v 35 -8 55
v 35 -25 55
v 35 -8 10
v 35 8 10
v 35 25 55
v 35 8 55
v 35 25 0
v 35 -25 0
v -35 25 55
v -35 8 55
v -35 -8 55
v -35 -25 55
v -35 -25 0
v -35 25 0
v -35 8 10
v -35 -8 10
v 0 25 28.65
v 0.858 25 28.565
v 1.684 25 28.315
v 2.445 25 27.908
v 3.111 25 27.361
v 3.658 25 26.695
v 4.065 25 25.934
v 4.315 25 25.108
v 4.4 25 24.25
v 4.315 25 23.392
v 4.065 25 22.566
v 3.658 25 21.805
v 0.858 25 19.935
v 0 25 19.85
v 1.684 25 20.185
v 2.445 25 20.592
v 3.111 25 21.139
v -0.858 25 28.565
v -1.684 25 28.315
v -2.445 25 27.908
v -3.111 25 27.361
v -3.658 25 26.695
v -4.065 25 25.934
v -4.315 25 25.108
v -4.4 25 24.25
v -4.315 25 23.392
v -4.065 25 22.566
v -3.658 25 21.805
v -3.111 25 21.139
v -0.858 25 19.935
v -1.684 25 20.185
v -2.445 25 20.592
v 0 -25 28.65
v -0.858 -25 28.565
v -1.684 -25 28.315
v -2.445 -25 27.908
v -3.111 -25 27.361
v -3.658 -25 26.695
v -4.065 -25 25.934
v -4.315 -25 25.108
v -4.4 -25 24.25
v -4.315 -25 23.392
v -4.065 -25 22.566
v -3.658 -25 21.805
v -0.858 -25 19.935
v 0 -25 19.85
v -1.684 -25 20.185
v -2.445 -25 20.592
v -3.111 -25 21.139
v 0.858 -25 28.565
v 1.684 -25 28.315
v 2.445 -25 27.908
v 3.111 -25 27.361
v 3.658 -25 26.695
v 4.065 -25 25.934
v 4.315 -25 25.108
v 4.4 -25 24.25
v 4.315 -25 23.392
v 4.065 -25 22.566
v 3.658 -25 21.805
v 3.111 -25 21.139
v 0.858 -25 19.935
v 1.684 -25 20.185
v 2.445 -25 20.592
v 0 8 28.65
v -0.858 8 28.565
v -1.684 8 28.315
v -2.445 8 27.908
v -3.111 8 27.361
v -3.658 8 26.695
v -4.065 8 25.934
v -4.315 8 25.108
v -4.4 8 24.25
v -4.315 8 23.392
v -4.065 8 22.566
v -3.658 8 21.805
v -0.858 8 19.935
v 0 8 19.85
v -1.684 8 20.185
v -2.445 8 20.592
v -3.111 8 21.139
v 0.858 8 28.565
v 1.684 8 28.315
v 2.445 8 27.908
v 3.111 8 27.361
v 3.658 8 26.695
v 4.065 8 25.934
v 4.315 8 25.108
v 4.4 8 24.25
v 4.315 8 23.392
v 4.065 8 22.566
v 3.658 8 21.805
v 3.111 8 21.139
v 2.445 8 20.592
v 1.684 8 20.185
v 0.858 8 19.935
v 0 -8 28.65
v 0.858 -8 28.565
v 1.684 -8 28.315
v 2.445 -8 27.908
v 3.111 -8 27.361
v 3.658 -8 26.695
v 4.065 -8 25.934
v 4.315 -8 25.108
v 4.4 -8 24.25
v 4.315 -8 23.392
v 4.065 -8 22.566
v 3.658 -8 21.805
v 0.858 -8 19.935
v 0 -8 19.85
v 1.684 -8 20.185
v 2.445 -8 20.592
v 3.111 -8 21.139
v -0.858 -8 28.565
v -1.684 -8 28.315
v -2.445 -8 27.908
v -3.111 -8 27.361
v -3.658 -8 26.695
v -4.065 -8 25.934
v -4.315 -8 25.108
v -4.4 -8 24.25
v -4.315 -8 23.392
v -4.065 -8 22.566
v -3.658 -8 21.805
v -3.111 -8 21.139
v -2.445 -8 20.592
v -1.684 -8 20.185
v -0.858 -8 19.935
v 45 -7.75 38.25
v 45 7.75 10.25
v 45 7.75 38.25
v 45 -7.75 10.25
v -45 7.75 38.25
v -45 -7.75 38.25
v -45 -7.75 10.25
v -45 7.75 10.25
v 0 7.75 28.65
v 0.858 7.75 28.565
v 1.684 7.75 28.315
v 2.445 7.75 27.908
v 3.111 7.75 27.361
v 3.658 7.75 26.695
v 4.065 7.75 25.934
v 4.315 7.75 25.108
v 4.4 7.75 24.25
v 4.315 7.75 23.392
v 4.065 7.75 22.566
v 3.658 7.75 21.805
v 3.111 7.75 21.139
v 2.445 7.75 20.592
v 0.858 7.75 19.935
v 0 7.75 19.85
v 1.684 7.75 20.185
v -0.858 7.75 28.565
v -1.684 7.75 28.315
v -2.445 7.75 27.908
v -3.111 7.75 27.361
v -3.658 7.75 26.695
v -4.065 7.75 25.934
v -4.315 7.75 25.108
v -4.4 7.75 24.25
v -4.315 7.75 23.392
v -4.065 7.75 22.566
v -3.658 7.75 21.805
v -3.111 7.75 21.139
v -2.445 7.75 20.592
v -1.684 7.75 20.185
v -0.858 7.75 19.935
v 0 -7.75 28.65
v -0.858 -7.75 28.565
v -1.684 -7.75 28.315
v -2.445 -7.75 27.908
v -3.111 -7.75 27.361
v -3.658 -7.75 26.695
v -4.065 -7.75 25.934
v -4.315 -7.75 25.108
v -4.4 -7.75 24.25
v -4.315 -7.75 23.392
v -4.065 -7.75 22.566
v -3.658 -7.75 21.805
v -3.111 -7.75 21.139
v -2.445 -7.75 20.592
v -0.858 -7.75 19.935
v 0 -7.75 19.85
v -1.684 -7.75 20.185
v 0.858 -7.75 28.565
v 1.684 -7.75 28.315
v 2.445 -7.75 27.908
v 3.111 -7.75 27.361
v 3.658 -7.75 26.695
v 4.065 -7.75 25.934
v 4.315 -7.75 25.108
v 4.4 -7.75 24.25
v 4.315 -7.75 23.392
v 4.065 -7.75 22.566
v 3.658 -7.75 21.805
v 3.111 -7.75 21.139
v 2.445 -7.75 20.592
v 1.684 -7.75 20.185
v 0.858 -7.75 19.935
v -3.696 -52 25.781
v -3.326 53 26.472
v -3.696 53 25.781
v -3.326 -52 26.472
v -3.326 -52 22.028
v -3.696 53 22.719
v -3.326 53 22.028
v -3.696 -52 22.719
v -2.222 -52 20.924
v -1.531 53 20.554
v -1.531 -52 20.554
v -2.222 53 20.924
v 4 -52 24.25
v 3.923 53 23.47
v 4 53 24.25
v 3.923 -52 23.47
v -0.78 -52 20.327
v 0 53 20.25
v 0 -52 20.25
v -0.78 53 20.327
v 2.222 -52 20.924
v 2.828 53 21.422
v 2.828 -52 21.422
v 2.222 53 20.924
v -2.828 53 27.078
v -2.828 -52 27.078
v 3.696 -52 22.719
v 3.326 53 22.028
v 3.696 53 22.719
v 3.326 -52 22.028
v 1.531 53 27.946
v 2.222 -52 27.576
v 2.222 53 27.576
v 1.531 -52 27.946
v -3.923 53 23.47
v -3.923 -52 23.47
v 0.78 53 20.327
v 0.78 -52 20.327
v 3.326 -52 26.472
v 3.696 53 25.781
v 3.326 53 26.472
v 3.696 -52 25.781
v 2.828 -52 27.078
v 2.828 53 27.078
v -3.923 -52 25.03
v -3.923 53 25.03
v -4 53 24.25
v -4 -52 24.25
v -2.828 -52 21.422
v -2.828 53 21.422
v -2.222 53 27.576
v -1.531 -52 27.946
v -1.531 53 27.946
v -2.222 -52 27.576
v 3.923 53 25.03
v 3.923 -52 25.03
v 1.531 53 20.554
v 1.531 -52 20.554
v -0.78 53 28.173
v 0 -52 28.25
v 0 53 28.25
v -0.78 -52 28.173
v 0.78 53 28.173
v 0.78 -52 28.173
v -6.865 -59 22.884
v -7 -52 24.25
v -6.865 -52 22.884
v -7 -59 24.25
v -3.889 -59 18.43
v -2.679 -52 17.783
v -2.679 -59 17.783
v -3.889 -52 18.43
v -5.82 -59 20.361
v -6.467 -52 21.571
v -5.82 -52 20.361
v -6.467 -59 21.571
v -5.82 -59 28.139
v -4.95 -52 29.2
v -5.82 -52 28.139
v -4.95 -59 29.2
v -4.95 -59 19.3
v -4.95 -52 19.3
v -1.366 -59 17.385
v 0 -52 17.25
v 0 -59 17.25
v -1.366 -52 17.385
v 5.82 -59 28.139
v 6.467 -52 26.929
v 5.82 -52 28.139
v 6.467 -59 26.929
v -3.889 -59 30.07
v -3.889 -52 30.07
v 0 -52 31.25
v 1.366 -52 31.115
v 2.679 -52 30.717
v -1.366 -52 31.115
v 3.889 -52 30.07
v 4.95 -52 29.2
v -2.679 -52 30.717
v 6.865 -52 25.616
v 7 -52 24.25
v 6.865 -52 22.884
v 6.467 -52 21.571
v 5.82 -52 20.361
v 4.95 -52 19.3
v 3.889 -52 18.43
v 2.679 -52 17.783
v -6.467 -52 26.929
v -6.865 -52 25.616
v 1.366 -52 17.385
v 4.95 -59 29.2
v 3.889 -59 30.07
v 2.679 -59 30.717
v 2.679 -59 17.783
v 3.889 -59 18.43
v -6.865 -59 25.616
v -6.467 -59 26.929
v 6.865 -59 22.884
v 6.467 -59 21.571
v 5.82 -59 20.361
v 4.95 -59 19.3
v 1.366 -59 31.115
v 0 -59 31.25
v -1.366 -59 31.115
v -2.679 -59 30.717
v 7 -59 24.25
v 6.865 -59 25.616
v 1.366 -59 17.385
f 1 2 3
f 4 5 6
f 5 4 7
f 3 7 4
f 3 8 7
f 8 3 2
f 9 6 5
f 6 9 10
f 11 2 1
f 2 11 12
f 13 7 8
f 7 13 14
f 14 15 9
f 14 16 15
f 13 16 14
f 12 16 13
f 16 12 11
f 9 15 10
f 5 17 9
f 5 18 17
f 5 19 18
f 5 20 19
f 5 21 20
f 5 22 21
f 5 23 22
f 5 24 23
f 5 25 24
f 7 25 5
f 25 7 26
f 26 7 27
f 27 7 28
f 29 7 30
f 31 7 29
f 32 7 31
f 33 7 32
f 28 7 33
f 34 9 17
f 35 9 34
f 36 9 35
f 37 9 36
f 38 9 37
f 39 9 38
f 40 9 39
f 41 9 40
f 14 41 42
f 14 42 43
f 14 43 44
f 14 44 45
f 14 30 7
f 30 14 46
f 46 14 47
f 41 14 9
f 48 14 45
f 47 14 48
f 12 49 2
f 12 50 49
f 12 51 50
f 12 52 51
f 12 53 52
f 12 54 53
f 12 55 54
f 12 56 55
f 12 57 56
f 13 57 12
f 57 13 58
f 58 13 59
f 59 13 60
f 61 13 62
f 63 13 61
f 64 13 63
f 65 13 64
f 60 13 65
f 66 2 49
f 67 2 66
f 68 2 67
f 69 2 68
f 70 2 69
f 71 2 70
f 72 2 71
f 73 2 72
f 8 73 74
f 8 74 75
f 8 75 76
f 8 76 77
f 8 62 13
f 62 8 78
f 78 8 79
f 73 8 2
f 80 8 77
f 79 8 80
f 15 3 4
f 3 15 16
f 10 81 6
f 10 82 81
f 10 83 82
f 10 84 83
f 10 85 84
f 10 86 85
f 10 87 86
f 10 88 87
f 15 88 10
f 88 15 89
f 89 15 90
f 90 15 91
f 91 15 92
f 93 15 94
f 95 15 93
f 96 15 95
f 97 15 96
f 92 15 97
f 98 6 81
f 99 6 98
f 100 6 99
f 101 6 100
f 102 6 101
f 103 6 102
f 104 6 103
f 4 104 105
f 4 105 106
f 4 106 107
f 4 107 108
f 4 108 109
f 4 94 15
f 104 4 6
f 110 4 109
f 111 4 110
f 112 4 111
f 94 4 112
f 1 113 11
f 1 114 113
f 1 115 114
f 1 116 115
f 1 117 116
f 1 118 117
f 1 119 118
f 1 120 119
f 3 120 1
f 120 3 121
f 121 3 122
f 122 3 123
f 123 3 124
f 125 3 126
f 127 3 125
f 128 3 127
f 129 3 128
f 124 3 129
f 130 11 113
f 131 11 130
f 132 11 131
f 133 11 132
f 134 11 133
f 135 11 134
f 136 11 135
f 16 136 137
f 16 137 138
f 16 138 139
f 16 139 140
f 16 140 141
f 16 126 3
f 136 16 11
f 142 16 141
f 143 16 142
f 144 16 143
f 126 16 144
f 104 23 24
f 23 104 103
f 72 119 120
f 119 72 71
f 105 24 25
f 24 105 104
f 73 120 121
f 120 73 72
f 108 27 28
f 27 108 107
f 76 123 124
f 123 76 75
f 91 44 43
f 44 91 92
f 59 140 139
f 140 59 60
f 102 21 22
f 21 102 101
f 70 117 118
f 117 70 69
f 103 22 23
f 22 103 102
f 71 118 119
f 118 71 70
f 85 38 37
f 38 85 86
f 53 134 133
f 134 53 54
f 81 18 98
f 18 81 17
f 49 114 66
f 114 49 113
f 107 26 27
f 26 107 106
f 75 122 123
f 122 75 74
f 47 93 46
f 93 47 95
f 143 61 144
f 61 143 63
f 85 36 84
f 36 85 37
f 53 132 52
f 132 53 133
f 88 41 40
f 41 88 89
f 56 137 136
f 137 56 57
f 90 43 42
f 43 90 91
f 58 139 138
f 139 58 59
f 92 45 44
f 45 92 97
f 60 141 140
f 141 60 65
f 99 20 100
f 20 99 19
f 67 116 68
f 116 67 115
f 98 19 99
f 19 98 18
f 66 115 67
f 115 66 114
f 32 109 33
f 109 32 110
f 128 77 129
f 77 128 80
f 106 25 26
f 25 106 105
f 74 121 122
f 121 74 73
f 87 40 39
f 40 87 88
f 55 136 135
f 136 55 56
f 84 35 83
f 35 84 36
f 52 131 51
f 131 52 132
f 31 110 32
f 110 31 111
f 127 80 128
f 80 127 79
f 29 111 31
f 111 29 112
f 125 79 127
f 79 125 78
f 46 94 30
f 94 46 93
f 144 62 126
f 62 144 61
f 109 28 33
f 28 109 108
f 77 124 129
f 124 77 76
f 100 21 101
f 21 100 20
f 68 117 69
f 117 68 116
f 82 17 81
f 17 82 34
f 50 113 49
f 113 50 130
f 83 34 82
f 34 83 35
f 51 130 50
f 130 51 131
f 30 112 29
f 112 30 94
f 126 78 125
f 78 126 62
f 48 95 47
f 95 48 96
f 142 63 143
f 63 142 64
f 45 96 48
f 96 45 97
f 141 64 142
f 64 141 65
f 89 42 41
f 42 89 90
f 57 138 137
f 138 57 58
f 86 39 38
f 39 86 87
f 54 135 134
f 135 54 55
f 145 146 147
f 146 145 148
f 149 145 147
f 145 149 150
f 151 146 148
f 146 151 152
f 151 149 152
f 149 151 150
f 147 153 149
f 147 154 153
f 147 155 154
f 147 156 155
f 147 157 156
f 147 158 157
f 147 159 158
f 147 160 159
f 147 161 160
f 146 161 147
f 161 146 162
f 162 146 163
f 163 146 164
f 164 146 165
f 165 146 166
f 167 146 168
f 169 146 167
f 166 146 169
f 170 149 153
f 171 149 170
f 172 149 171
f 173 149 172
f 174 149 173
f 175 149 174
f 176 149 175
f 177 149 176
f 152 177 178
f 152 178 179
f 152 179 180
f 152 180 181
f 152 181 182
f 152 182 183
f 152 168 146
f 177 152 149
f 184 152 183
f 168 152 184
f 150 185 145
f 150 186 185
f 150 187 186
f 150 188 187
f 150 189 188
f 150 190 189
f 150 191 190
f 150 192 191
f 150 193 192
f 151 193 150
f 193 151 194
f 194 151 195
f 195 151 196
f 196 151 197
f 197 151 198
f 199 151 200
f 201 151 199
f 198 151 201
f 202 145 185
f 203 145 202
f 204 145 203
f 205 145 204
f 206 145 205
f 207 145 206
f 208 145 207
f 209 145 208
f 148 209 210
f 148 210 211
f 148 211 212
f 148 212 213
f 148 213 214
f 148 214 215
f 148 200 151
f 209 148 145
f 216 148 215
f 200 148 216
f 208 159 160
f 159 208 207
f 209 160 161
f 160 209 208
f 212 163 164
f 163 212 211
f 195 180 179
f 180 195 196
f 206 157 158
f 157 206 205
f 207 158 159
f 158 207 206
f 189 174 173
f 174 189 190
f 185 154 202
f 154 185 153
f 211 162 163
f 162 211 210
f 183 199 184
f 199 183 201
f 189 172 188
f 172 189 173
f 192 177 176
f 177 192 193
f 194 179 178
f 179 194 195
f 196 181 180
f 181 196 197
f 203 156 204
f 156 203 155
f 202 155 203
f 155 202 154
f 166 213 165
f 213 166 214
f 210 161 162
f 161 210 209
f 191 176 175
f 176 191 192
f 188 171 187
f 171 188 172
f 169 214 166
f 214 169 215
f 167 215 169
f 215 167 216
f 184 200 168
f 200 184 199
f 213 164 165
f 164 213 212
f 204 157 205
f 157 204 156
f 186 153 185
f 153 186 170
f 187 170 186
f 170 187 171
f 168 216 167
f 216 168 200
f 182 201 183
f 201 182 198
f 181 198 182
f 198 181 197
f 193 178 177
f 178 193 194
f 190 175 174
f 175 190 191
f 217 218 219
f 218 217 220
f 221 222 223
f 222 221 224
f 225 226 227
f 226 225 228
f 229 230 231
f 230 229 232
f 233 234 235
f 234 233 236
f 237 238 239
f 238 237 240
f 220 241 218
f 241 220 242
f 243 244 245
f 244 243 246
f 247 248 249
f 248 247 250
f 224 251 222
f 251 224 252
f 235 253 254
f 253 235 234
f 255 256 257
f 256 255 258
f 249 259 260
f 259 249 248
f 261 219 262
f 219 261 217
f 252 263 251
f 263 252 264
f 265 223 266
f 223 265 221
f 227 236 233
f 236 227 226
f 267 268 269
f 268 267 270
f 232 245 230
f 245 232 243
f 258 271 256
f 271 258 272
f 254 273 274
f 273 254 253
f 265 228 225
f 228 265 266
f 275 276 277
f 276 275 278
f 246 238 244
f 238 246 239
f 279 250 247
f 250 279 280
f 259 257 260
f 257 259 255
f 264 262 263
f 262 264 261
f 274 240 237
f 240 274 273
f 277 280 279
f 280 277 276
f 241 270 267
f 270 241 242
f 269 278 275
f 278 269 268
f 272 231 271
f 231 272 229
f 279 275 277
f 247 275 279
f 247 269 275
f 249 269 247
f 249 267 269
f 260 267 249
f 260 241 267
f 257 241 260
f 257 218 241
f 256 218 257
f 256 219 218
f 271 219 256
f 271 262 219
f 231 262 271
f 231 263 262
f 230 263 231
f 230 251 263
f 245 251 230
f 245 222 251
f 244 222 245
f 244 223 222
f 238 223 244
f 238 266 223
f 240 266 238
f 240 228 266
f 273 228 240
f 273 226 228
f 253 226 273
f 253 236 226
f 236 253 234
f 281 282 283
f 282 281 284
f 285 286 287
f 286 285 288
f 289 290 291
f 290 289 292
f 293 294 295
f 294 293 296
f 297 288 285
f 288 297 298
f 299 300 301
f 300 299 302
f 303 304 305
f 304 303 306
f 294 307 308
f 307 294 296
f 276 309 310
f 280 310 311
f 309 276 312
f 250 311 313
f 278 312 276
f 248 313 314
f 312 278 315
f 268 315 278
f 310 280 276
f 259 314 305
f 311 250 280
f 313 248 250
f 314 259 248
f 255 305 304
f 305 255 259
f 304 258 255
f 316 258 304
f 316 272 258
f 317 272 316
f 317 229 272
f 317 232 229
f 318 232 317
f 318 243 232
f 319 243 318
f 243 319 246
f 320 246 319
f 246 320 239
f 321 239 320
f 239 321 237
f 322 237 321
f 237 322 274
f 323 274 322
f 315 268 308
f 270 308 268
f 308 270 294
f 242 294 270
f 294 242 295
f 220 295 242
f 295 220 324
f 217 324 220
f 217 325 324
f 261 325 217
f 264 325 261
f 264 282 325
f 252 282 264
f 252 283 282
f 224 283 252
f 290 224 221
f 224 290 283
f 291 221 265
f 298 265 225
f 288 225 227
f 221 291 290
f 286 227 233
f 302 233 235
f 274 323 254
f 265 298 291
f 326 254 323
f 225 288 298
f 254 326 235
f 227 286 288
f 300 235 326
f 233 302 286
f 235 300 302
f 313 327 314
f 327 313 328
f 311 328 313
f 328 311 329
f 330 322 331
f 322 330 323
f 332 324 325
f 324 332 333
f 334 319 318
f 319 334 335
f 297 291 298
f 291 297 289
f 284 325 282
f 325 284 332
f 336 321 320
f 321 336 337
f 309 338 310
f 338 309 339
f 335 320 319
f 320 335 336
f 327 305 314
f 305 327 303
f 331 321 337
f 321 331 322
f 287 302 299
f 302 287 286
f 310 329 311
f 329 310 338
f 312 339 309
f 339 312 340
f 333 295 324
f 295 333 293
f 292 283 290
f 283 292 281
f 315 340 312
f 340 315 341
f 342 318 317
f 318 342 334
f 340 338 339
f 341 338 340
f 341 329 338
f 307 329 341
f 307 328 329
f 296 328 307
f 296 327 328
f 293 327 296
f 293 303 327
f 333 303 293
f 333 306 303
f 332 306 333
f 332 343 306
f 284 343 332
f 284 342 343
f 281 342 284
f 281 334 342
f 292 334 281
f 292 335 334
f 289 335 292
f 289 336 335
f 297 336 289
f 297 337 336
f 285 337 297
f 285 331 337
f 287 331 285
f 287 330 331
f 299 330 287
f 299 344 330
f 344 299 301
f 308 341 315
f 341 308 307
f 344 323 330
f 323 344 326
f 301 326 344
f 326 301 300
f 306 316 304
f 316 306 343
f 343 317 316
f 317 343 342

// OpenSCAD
$fn = 32;

// ------------------------------------------------------------------------
// Clevis joint: 70 mm clevis, pin d8
// Every part is its own module, assembly() places them once.
// ------------------------------------------------------------------------

// --- part 1 ---
module clevis() {
  difference() {
    translate([-35, -25, 0]) cube([70, 50, 55]);
    translate([-36, -8, 10]) cube([72, 16, 46]);
    translate([0, 0, 24.25]) rotate([90, 0, 0]) cylinder(h = 52, d = 8.8, center = true);
  }
}

// --- part 2 ---
module eye() {
  difference() {
    translate([-45, -7.75, 0]) cube([90, 15.5, 28]);
    translate([0, 0, 14]) rotate([90, 0, 0]) cylinder(h = 17.5, d = 8.8, center = true);
  }
}

// --- part 3 ---
module pin() {
  rotate([0, 90, 0]) cylinder(h = 106, d = 8, center = true);
  translate([-59, 0, 0]) rotate([0, 90, 0]) cylinder(h = 7, d = 14);
}

// --- assembly ---
module assembly() {
  translate([0, 0, 0]) rotate([0, 0, 0]) clevis();
  translate([0, 0, 10.25]) rotate([0, 0, 0]) eye();
  translate([0, 0, 24.25]) rotate([0, 0, 90]) pin();
}

assembly();
